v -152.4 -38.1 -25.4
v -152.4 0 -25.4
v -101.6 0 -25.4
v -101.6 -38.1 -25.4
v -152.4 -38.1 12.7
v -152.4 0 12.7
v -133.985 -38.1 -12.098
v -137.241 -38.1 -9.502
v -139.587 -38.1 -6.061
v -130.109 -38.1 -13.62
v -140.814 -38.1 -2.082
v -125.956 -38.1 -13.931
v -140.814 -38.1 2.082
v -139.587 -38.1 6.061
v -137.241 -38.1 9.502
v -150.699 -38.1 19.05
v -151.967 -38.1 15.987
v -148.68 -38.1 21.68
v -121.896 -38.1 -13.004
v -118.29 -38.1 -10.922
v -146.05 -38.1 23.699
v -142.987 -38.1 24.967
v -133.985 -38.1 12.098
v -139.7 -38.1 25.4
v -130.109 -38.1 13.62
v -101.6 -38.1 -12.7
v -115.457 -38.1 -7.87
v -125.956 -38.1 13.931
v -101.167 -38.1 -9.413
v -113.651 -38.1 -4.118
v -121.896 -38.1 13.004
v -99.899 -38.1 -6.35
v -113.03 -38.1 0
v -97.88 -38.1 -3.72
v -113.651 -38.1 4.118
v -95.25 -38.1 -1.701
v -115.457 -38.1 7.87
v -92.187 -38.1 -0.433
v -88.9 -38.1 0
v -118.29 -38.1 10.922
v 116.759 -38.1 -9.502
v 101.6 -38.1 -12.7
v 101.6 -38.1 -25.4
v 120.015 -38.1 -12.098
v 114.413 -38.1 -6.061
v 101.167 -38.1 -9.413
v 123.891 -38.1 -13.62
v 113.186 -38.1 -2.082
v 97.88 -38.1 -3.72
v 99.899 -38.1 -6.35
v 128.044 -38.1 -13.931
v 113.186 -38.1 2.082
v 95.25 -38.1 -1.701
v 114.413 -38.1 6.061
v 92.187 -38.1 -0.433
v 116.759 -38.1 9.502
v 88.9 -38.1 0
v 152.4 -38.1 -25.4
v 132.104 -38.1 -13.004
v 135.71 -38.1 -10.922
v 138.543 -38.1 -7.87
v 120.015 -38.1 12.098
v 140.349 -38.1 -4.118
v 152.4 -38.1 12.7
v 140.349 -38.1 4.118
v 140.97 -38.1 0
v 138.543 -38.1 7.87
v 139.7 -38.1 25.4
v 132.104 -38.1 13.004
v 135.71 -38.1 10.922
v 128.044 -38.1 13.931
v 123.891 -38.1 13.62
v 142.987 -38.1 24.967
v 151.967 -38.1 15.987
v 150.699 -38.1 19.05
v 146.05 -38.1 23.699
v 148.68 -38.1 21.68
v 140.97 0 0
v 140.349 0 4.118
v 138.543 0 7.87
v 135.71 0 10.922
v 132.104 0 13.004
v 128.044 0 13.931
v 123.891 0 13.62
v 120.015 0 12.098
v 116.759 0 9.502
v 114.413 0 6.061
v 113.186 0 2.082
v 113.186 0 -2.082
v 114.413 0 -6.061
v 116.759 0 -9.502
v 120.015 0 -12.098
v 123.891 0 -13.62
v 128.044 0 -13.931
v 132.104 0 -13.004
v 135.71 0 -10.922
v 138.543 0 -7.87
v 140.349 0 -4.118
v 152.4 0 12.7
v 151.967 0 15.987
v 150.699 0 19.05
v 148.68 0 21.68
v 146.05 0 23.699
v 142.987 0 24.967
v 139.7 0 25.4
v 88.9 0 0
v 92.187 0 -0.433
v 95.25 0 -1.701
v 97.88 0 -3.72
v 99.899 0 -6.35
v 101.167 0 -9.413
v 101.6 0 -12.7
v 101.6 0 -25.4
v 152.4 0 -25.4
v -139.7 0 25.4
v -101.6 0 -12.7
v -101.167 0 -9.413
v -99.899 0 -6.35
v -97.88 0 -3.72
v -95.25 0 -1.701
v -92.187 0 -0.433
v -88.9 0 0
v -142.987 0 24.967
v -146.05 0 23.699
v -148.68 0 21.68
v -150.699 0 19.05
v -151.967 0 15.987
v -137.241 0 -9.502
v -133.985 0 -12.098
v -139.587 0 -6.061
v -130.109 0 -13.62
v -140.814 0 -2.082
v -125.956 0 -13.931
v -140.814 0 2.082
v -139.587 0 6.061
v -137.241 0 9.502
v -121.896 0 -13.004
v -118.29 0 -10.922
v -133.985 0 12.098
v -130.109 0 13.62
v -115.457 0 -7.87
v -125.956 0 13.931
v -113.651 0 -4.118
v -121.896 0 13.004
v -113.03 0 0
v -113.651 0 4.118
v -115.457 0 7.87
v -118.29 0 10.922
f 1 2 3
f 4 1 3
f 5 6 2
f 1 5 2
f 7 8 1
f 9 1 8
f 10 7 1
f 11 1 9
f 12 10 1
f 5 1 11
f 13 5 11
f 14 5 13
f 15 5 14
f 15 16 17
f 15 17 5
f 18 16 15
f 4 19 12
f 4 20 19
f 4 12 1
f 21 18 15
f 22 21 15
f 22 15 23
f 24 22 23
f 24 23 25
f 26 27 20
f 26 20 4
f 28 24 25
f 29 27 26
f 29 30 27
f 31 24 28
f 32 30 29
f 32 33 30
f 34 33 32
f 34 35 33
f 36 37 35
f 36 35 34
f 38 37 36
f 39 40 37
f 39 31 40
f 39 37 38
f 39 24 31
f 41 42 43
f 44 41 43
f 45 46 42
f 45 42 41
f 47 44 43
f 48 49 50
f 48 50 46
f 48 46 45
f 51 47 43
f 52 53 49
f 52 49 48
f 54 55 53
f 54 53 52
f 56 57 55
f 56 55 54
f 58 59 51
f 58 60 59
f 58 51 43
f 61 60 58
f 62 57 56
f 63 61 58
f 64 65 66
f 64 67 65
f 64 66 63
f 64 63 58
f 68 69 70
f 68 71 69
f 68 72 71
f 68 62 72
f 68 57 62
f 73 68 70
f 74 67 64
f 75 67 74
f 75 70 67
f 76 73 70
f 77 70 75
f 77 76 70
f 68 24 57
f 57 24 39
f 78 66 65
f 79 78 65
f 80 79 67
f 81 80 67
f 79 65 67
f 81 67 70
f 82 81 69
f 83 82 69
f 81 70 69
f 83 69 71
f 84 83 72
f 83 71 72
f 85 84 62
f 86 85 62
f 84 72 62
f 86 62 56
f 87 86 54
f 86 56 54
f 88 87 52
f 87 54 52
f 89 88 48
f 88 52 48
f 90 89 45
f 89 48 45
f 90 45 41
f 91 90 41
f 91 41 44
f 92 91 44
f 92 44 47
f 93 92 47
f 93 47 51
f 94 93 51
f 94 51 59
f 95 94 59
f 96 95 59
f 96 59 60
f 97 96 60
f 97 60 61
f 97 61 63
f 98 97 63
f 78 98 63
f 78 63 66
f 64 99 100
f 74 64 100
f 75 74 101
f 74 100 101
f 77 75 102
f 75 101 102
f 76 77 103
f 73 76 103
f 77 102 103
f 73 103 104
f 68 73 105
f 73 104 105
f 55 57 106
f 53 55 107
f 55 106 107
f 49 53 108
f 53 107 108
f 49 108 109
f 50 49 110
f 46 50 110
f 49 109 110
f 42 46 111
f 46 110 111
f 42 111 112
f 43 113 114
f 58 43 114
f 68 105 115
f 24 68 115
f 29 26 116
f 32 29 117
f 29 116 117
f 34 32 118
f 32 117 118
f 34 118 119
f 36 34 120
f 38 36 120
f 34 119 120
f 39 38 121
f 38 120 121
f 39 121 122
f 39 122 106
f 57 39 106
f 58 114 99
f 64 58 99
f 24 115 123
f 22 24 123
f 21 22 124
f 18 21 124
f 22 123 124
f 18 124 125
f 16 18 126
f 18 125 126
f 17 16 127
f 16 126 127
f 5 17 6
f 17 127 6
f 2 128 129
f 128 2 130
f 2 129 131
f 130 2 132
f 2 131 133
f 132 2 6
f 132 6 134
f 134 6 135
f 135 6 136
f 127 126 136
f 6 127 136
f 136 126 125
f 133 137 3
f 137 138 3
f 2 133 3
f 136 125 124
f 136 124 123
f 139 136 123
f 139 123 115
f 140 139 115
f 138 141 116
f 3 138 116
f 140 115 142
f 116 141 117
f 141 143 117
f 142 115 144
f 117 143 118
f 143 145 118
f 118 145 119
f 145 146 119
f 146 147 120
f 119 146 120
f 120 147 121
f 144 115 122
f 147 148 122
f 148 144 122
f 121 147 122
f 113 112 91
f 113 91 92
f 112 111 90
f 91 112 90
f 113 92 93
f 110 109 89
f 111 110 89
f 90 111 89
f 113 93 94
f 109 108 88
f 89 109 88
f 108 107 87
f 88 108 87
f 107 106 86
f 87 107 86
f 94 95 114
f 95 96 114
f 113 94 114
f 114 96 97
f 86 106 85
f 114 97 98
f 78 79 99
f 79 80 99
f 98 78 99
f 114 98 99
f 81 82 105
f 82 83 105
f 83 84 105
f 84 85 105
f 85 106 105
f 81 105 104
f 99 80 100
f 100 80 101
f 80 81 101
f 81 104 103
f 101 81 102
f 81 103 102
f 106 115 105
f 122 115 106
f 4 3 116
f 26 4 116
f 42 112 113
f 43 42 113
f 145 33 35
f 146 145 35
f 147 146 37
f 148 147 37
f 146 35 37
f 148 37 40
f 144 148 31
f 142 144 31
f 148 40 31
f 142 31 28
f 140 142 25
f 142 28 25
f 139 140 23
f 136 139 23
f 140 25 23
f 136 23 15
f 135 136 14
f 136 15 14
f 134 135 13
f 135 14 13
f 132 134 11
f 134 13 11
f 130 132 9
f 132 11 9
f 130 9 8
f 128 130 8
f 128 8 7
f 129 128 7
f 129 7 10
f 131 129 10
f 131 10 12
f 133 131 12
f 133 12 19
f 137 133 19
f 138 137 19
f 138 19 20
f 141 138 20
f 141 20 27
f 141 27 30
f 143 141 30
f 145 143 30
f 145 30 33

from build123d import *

# Parameters (mm, degrees)
F1_DEPTH = 38.1
F2_R     = 13.97
F3_DEPTH = 38.101


with BuildPart() as f1:
    # F0 (on Front) → F1 (new body)
    with BuildSketch(Plane.XZ):
        with BuildLine():
            Line((139.7, 25.4), (-139.7, 25.4))
            ThreePointArc((-139.7, 25.4), (-148.680256, 21.680256), (-152.4, 12.7))
            Line((-152.4, 12.7), (-152.4, -25.4))
            Line((-152.4, -25.4), (-101.6, -25.4))
            Line((-101.6, -25.4), (-101.6, -12.7))
            ThreePointArc((-101.6, -12.7), (-97.880256, -3.719744), (-88.9, 0))
            Line((-88.9, 0), (88.9, 0))
            ThreePointArc((88.9, 0), (97.880256, -3.719744), (101.6, -12.7))
            Line((101.6, -12.7), (101.6, -25.4))
            Line((101.6, -25.4), (152.4, -25.4))
            Line((152.4, -25.4), (152.4, 12.7))
            ThreePointArc((152.4, 12.7), (148.680256, 21.680256), (139.7, 25.4))
        make_face()
    extrude(amount=F1_DEPTH)

    # F2 (on face) → F3 (cut, through all)
    with BuildSketch(Plane.XZ.offset(38.1)):
        with Locations((-127, 0)):
            Circle(F2_R)
        with Locations((127, 0)):
            Circle(F2_R)
    extrude(amount=-F3_DEPTH, mode=Mode.SUBTRACT)


solid = f1.part
